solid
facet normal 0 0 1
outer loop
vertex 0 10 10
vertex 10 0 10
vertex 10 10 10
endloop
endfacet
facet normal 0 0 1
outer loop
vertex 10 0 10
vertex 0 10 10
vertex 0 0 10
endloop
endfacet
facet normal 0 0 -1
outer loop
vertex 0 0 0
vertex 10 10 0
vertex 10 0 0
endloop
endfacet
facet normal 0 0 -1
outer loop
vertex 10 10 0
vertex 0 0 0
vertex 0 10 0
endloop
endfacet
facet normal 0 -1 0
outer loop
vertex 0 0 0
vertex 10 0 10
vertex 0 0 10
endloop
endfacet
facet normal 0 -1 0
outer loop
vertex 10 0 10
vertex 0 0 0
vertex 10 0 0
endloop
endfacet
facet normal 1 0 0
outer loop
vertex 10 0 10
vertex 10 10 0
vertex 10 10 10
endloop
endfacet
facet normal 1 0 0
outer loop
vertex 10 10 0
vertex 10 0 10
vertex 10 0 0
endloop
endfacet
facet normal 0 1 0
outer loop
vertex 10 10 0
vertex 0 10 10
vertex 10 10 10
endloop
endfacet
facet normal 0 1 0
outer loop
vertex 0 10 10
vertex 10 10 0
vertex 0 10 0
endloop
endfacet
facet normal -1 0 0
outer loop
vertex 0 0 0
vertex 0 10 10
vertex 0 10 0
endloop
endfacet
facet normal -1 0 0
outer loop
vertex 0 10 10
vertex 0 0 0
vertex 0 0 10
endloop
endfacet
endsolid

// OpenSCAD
// Unit of length: Unit.MM
cube(size = 10.0, center = false);
